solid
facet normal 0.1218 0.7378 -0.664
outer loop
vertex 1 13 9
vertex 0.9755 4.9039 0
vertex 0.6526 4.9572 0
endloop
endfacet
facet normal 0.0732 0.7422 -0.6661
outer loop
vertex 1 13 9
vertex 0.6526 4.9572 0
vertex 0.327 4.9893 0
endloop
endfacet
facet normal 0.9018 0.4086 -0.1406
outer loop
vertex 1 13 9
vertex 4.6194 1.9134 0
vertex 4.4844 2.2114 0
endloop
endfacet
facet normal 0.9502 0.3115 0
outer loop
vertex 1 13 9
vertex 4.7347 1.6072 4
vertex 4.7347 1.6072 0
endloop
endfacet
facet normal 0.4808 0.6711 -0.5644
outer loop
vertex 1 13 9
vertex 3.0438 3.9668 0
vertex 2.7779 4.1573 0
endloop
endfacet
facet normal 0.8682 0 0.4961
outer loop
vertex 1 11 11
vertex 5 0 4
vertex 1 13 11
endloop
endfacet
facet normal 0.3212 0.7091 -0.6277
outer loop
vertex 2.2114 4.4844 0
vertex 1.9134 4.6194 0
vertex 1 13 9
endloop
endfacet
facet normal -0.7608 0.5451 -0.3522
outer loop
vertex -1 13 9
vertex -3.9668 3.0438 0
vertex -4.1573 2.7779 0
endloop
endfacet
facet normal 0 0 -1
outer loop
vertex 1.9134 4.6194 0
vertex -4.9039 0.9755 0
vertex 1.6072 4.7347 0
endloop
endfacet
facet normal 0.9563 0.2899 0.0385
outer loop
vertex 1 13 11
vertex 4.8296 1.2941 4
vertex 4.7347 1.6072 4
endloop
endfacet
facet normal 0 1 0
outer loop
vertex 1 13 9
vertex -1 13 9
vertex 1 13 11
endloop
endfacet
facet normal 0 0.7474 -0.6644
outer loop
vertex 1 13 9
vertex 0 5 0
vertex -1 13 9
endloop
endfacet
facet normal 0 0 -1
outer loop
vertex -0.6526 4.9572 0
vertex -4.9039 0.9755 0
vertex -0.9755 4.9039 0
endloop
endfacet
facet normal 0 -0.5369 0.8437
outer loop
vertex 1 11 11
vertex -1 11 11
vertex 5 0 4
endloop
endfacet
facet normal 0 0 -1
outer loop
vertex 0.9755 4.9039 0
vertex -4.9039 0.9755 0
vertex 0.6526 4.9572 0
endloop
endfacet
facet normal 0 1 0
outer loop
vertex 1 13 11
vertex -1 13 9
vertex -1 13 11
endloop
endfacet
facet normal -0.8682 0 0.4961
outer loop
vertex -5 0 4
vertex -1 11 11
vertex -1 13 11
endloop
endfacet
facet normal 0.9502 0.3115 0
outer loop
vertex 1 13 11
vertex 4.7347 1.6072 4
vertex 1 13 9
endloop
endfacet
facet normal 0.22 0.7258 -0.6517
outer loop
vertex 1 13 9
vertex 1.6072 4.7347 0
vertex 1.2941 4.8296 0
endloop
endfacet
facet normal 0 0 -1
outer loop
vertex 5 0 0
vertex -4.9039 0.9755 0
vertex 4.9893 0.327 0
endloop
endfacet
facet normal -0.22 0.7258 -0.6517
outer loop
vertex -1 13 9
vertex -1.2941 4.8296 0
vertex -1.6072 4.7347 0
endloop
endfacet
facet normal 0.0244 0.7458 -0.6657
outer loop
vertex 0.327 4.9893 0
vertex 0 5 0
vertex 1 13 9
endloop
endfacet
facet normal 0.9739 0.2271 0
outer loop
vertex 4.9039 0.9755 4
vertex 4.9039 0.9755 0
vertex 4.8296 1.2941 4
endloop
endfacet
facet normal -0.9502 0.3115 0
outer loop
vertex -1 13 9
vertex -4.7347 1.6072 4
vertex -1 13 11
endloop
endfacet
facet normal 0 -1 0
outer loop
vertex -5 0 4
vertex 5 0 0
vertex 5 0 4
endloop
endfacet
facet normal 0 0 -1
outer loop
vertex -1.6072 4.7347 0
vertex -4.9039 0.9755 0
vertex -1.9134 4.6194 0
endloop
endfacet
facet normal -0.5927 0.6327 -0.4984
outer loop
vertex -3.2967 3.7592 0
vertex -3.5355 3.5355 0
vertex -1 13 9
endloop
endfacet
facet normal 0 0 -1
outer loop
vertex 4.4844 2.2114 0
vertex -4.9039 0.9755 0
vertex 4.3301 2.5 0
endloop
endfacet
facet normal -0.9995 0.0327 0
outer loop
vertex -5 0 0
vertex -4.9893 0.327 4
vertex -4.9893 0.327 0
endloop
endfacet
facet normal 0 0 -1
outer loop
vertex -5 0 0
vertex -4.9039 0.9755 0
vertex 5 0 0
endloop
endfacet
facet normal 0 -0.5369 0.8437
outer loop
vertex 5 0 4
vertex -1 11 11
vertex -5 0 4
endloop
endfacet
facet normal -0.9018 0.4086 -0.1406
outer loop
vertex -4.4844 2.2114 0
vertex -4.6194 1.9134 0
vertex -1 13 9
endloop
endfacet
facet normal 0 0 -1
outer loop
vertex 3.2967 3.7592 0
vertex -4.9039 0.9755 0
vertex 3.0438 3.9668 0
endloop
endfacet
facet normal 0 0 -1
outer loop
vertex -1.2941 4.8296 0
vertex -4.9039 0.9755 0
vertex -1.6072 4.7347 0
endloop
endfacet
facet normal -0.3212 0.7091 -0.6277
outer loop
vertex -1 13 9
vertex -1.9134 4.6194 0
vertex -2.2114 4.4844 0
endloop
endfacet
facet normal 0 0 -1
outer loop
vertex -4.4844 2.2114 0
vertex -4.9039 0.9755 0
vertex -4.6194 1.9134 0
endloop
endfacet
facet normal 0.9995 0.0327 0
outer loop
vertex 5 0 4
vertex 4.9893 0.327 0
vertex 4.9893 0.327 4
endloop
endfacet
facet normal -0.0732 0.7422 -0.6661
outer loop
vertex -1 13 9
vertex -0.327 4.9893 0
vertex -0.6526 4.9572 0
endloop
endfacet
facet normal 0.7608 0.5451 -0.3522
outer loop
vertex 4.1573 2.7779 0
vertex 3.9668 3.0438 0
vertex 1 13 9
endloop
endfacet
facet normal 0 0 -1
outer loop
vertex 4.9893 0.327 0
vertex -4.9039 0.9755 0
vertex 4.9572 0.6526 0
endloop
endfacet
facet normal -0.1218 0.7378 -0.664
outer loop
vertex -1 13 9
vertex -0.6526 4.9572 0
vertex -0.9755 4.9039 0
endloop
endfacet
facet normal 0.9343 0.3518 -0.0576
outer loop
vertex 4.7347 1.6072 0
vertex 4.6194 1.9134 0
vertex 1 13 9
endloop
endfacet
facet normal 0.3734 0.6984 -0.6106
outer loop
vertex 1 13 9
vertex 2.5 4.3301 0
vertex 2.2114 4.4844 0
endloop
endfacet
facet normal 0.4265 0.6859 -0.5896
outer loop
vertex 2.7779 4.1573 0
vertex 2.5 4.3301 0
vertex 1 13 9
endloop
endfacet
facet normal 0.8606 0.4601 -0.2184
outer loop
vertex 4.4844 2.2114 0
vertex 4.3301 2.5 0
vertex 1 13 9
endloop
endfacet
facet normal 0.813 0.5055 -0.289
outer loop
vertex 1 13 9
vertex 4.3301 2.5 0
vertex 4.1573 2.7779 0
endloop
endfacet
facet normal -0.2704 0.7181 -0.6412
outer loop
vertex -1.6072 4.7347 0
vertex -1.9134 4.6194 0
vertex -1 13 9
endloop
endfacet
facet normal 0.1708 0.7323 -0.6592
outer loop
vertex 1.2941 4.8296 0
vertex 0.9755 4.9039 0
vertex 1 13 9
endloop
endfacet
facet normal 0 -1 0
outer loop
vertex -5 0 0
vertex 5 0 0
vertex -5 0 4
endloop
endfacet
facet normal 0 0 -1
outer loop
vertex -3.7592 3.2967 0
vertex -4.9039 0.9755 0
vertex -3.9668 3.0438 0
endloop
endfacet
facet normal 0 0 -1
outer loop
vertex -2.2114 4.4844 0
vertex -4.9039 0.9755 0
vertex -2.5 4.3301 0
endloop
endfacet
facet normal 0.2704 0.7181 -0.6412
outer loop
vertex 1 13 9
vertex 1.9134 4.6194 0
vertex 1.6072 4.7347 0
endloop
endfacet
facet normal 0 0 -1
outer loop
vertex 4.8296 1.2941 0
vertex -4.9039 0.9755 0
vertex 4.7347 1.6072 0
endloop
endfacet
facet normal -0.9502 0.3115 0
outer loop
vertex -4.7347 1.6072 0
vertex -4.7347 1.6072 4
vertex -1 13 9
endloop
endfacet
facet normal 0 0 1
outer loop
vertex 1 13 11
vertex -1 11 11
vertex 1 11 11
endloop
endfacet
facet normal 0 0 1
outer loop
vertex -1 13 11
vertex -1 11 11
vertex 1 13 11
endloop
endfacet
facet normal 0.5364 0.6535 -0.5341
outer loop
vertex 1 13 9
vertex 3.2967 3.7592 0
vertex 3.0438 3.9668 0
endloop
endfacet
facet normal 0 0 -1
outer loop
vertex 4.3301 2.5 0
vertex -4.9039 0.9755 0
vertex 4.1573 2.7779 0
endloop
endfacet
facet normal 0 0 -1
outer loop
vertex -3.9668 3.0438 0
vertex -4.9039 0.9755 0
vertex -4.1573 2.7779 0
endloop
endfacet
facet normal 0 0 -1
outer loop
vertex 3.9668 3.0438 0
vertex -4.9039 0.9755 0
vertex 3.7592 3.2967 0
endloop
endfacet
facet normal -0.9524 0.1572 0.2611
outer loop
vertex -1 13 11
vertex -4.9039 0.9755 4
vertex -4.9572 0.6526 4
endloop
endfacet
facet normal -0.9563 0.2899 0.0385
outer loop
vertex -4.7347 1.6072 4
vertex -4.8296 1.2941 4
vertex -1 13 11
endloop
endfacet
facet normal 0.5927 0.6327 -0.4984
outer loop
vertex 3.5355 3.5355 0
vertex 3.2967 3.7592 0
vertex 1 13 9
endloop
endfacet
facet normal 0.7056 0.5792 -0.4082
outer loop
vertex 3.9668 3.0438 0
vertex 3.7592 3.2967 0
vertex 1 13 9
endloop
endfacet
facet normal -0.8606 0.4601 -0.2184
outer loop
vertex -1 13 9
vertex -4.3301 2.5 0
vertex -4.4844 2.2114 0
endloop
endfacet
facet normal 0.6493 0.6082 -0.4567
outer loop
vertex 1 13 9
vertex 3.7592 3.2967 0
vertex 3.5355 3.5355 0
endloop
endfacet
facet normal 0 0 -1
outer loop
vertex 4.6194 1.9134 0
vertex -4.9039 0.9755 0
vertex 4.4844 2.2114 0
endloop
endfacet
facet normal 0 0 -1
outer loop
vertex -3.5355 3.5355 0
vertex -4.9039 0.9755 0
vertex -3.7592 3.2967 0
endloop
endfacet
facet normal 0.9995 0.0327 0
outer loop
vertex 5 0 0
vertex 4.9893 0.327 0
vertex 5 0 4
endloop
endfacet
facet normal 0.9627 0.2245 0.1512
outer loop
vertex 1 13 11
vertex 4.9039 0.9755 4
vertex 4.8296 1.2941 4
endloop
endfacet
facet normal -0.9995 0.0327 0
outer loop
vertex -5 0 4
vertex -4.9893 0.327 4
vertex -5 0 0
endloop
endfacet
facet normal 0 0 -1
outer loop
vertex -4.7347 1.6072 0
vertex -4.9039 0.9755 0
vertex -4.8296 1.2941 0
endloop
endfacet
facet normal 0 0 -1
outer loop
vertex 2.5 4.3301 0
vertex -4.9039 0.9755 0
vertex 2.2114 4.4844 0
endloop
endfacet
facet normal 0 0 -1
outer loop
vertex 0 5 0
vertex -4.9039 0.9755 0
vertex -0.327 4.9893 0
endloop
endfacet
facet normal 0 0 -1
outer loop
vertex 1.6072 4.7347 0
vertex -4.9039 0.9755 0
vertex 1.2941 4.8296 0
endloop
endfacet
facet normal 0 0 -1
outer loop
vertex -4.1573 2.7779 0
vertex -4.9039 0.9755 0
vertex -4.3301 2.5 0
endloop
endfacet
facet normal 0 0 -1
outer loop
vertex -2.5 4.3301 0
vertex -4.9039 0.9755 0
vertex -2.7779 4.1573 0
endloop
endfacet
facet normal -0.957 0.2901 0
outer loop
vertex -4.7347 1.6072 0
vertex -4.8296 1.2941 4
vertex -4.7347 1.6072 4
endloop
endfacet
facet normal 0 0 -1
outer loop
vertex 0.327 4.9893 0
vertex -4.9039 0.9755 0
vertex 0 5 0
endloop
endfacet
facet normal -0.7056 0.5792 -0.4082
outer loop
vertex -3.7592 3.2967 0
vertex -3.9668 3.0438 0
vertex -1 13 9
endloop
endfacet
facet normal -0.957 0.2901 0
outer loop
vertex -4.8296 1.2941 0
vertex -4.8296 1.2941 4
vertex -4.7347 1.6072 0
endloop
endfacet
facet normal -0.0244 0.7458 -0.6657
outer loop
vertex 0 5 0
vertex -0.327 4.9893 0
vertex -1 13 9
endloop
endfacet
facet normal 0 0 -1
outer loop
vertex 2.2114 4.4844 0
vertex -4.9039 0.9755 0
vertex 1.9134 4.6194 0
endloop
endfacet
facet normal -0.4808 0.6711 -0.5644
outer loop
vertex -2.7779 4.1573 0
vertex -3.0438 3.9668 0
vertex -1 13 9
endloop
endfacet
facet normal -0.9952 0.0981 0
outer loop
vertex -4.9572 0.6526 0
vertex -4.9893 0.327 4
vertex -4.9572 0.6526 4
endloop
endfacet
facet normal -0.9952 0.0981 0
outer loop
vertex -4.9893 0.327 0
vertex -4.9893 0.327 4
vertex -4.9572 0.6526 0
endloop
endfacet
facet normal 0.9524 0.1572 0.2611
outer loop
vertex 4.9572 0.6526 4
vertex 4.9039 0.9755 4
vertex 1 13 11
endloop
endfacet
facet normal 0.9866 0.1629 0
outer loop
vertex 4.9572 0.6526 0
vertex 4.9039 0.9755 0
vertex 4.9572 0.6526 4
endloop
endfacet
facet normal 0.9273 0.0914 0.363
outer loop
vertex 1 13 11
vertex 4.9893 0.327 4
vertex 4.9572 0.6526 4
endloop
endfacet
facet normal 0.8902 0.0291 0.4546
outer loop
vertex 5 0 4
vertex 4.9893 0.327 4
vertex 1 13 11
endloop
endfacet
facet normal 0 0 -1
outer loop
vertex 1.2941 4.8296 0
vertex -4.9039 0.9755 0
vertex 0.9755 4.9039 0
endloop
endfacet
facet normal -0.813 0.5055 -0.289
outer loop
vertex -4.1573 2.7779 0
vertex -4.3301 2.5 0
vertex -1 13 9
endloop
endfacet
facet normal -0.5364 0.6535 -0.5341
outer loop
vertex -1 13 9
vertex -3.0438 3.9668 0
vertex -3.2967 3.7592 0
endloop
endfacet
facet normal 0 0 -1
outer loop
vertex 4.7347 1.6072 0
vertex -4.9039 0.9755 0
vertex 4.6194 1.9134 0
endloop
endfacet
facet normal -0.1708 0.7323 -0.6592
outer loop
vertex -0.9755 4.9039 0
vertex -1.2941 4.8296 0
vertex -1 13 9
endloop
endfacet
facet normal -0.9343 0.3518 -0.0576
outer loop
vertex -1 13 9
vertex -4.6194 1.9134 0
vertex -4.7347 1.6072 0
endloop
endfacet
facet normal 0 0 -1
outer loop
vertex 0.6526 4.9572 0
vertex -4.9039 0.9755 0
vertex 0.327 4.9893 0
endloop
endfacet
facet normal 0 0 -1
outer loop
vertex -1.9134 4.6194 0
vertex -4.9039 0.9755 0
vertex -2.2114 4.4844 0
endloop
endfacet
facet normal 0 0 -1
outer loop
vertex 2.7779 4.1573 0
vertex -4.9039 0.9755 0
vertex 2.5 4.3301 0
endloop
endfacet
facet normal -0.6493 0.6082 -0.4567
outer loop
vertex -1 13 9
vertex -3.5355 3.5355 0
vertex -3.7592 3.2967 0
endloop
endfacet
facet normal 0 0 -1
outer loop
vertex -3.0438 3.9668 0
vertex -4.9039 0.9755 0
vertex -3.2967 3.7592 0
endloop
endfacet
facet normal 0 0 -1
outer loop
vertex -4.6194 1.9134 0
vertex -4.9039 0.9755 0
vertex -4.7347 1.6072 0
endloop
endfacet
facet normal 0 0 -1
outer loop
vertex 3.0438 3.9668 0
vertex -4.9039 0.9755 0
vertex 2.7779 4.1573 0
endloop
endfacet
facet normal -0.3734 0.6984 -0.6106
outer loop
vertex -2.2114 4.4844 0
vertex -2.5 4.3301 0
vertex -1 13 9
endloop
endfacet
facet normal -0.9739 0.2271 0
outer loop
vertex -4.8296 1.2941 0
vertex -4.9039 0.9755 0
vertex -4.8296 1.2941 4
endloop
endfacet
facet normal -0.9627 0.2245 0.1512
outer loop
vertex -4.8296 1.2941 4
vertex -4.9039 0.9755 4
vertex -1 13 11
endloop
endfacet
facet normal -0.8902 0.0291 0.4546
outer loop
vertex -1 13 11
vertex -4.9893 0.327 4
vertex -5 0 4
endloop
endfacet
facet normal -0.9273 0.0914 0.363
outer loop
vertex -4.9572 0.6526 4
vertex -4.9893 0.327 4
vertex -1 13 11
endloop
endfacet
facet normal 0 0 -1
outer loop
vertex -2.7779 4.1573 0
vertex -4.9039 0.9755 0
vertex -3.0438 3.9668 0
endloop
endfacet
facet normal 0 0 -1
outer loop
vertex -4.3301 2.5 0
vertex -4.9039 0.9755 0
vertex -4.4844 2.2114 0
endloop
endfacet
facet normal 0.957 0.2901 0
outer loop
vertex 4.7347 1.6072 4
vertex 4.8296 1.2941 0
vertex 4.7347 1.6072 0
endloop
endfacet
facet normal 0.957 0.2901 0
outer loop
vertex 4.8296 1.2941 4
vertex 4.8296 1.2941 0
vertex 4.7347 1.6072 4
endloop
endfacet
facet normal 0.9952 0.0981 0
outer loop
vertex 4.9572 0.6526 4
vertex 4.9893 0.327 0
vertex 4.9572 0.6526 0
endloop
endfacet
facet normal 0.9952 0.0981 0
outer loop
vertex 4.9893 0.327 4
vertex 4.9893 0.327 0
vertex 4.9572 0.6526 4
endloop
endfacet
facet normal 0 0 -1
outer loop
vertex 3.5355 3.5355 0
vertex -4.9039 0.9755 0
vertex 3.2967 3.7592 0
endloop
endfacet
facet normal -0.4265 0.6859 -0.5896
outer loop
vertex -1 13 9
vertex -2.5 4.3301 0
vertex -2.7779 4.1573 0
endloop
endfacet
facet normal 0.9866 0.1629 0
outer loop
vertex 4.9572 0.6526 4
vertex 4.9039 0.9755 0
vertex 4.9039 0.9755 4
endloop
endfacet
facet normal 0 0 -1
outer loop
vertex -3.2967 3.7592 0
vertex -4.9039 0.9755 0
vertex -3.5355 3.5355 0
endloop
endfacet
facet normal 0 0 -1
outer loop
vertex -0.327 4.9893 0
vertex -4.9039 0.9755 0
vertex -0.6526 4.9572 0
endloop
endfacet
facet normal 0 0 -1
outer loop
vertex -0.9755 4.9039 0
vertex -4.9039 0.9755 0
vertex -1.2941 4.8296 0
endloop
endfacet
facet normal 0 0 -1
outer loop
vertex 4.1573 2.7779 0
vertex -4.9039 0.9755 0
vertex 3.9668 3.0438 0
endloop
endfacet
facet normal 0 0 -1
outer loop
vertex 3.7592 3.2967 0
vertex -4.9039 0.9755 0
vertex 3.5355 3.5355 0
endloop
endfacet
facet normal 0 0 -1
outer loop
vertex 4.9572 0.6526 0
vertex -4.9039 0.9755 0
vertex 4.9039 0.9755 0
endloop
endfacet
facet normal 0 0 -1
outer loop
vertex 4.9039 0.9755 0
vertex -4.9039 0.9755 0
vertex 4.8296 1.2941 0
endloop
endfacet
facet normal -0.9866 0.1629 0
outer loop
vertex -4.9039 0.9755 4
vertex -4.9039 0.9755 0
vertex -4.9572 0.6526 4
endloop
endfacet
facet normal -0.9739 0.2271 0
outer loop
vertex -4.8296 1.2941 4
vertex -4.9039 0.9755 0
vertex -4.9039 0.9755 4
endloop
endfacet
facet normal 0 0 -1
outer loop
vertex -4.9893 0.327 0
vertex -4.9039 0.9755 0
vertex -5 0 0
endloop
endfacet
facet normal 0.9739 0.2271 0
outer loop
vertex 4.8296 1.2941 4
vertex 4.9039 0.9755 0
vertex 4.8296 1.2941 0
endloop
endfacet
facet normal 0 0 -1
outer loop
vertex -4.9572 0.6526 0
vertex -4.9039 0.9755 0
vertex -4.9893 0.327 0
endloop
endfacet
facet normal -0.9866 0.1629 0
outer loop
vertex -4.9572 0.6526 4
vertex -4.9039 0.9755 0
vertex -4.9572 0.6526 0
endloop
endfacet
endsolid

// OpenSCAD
// a D-shaped boss — a cylinder CUT in half — hulled with a block (things 2727786, 1006380): its
// rims are half circles whose ends are vertices, planned as arc features.
$fn = 96;
hull() {
  difference() {
    cylinder(r = 5, h = 4);
    translate([-10, -10, -1]) cube([20, 10, 6]);
  }
  translate([-1, 11, 9]) cube(2);
}
